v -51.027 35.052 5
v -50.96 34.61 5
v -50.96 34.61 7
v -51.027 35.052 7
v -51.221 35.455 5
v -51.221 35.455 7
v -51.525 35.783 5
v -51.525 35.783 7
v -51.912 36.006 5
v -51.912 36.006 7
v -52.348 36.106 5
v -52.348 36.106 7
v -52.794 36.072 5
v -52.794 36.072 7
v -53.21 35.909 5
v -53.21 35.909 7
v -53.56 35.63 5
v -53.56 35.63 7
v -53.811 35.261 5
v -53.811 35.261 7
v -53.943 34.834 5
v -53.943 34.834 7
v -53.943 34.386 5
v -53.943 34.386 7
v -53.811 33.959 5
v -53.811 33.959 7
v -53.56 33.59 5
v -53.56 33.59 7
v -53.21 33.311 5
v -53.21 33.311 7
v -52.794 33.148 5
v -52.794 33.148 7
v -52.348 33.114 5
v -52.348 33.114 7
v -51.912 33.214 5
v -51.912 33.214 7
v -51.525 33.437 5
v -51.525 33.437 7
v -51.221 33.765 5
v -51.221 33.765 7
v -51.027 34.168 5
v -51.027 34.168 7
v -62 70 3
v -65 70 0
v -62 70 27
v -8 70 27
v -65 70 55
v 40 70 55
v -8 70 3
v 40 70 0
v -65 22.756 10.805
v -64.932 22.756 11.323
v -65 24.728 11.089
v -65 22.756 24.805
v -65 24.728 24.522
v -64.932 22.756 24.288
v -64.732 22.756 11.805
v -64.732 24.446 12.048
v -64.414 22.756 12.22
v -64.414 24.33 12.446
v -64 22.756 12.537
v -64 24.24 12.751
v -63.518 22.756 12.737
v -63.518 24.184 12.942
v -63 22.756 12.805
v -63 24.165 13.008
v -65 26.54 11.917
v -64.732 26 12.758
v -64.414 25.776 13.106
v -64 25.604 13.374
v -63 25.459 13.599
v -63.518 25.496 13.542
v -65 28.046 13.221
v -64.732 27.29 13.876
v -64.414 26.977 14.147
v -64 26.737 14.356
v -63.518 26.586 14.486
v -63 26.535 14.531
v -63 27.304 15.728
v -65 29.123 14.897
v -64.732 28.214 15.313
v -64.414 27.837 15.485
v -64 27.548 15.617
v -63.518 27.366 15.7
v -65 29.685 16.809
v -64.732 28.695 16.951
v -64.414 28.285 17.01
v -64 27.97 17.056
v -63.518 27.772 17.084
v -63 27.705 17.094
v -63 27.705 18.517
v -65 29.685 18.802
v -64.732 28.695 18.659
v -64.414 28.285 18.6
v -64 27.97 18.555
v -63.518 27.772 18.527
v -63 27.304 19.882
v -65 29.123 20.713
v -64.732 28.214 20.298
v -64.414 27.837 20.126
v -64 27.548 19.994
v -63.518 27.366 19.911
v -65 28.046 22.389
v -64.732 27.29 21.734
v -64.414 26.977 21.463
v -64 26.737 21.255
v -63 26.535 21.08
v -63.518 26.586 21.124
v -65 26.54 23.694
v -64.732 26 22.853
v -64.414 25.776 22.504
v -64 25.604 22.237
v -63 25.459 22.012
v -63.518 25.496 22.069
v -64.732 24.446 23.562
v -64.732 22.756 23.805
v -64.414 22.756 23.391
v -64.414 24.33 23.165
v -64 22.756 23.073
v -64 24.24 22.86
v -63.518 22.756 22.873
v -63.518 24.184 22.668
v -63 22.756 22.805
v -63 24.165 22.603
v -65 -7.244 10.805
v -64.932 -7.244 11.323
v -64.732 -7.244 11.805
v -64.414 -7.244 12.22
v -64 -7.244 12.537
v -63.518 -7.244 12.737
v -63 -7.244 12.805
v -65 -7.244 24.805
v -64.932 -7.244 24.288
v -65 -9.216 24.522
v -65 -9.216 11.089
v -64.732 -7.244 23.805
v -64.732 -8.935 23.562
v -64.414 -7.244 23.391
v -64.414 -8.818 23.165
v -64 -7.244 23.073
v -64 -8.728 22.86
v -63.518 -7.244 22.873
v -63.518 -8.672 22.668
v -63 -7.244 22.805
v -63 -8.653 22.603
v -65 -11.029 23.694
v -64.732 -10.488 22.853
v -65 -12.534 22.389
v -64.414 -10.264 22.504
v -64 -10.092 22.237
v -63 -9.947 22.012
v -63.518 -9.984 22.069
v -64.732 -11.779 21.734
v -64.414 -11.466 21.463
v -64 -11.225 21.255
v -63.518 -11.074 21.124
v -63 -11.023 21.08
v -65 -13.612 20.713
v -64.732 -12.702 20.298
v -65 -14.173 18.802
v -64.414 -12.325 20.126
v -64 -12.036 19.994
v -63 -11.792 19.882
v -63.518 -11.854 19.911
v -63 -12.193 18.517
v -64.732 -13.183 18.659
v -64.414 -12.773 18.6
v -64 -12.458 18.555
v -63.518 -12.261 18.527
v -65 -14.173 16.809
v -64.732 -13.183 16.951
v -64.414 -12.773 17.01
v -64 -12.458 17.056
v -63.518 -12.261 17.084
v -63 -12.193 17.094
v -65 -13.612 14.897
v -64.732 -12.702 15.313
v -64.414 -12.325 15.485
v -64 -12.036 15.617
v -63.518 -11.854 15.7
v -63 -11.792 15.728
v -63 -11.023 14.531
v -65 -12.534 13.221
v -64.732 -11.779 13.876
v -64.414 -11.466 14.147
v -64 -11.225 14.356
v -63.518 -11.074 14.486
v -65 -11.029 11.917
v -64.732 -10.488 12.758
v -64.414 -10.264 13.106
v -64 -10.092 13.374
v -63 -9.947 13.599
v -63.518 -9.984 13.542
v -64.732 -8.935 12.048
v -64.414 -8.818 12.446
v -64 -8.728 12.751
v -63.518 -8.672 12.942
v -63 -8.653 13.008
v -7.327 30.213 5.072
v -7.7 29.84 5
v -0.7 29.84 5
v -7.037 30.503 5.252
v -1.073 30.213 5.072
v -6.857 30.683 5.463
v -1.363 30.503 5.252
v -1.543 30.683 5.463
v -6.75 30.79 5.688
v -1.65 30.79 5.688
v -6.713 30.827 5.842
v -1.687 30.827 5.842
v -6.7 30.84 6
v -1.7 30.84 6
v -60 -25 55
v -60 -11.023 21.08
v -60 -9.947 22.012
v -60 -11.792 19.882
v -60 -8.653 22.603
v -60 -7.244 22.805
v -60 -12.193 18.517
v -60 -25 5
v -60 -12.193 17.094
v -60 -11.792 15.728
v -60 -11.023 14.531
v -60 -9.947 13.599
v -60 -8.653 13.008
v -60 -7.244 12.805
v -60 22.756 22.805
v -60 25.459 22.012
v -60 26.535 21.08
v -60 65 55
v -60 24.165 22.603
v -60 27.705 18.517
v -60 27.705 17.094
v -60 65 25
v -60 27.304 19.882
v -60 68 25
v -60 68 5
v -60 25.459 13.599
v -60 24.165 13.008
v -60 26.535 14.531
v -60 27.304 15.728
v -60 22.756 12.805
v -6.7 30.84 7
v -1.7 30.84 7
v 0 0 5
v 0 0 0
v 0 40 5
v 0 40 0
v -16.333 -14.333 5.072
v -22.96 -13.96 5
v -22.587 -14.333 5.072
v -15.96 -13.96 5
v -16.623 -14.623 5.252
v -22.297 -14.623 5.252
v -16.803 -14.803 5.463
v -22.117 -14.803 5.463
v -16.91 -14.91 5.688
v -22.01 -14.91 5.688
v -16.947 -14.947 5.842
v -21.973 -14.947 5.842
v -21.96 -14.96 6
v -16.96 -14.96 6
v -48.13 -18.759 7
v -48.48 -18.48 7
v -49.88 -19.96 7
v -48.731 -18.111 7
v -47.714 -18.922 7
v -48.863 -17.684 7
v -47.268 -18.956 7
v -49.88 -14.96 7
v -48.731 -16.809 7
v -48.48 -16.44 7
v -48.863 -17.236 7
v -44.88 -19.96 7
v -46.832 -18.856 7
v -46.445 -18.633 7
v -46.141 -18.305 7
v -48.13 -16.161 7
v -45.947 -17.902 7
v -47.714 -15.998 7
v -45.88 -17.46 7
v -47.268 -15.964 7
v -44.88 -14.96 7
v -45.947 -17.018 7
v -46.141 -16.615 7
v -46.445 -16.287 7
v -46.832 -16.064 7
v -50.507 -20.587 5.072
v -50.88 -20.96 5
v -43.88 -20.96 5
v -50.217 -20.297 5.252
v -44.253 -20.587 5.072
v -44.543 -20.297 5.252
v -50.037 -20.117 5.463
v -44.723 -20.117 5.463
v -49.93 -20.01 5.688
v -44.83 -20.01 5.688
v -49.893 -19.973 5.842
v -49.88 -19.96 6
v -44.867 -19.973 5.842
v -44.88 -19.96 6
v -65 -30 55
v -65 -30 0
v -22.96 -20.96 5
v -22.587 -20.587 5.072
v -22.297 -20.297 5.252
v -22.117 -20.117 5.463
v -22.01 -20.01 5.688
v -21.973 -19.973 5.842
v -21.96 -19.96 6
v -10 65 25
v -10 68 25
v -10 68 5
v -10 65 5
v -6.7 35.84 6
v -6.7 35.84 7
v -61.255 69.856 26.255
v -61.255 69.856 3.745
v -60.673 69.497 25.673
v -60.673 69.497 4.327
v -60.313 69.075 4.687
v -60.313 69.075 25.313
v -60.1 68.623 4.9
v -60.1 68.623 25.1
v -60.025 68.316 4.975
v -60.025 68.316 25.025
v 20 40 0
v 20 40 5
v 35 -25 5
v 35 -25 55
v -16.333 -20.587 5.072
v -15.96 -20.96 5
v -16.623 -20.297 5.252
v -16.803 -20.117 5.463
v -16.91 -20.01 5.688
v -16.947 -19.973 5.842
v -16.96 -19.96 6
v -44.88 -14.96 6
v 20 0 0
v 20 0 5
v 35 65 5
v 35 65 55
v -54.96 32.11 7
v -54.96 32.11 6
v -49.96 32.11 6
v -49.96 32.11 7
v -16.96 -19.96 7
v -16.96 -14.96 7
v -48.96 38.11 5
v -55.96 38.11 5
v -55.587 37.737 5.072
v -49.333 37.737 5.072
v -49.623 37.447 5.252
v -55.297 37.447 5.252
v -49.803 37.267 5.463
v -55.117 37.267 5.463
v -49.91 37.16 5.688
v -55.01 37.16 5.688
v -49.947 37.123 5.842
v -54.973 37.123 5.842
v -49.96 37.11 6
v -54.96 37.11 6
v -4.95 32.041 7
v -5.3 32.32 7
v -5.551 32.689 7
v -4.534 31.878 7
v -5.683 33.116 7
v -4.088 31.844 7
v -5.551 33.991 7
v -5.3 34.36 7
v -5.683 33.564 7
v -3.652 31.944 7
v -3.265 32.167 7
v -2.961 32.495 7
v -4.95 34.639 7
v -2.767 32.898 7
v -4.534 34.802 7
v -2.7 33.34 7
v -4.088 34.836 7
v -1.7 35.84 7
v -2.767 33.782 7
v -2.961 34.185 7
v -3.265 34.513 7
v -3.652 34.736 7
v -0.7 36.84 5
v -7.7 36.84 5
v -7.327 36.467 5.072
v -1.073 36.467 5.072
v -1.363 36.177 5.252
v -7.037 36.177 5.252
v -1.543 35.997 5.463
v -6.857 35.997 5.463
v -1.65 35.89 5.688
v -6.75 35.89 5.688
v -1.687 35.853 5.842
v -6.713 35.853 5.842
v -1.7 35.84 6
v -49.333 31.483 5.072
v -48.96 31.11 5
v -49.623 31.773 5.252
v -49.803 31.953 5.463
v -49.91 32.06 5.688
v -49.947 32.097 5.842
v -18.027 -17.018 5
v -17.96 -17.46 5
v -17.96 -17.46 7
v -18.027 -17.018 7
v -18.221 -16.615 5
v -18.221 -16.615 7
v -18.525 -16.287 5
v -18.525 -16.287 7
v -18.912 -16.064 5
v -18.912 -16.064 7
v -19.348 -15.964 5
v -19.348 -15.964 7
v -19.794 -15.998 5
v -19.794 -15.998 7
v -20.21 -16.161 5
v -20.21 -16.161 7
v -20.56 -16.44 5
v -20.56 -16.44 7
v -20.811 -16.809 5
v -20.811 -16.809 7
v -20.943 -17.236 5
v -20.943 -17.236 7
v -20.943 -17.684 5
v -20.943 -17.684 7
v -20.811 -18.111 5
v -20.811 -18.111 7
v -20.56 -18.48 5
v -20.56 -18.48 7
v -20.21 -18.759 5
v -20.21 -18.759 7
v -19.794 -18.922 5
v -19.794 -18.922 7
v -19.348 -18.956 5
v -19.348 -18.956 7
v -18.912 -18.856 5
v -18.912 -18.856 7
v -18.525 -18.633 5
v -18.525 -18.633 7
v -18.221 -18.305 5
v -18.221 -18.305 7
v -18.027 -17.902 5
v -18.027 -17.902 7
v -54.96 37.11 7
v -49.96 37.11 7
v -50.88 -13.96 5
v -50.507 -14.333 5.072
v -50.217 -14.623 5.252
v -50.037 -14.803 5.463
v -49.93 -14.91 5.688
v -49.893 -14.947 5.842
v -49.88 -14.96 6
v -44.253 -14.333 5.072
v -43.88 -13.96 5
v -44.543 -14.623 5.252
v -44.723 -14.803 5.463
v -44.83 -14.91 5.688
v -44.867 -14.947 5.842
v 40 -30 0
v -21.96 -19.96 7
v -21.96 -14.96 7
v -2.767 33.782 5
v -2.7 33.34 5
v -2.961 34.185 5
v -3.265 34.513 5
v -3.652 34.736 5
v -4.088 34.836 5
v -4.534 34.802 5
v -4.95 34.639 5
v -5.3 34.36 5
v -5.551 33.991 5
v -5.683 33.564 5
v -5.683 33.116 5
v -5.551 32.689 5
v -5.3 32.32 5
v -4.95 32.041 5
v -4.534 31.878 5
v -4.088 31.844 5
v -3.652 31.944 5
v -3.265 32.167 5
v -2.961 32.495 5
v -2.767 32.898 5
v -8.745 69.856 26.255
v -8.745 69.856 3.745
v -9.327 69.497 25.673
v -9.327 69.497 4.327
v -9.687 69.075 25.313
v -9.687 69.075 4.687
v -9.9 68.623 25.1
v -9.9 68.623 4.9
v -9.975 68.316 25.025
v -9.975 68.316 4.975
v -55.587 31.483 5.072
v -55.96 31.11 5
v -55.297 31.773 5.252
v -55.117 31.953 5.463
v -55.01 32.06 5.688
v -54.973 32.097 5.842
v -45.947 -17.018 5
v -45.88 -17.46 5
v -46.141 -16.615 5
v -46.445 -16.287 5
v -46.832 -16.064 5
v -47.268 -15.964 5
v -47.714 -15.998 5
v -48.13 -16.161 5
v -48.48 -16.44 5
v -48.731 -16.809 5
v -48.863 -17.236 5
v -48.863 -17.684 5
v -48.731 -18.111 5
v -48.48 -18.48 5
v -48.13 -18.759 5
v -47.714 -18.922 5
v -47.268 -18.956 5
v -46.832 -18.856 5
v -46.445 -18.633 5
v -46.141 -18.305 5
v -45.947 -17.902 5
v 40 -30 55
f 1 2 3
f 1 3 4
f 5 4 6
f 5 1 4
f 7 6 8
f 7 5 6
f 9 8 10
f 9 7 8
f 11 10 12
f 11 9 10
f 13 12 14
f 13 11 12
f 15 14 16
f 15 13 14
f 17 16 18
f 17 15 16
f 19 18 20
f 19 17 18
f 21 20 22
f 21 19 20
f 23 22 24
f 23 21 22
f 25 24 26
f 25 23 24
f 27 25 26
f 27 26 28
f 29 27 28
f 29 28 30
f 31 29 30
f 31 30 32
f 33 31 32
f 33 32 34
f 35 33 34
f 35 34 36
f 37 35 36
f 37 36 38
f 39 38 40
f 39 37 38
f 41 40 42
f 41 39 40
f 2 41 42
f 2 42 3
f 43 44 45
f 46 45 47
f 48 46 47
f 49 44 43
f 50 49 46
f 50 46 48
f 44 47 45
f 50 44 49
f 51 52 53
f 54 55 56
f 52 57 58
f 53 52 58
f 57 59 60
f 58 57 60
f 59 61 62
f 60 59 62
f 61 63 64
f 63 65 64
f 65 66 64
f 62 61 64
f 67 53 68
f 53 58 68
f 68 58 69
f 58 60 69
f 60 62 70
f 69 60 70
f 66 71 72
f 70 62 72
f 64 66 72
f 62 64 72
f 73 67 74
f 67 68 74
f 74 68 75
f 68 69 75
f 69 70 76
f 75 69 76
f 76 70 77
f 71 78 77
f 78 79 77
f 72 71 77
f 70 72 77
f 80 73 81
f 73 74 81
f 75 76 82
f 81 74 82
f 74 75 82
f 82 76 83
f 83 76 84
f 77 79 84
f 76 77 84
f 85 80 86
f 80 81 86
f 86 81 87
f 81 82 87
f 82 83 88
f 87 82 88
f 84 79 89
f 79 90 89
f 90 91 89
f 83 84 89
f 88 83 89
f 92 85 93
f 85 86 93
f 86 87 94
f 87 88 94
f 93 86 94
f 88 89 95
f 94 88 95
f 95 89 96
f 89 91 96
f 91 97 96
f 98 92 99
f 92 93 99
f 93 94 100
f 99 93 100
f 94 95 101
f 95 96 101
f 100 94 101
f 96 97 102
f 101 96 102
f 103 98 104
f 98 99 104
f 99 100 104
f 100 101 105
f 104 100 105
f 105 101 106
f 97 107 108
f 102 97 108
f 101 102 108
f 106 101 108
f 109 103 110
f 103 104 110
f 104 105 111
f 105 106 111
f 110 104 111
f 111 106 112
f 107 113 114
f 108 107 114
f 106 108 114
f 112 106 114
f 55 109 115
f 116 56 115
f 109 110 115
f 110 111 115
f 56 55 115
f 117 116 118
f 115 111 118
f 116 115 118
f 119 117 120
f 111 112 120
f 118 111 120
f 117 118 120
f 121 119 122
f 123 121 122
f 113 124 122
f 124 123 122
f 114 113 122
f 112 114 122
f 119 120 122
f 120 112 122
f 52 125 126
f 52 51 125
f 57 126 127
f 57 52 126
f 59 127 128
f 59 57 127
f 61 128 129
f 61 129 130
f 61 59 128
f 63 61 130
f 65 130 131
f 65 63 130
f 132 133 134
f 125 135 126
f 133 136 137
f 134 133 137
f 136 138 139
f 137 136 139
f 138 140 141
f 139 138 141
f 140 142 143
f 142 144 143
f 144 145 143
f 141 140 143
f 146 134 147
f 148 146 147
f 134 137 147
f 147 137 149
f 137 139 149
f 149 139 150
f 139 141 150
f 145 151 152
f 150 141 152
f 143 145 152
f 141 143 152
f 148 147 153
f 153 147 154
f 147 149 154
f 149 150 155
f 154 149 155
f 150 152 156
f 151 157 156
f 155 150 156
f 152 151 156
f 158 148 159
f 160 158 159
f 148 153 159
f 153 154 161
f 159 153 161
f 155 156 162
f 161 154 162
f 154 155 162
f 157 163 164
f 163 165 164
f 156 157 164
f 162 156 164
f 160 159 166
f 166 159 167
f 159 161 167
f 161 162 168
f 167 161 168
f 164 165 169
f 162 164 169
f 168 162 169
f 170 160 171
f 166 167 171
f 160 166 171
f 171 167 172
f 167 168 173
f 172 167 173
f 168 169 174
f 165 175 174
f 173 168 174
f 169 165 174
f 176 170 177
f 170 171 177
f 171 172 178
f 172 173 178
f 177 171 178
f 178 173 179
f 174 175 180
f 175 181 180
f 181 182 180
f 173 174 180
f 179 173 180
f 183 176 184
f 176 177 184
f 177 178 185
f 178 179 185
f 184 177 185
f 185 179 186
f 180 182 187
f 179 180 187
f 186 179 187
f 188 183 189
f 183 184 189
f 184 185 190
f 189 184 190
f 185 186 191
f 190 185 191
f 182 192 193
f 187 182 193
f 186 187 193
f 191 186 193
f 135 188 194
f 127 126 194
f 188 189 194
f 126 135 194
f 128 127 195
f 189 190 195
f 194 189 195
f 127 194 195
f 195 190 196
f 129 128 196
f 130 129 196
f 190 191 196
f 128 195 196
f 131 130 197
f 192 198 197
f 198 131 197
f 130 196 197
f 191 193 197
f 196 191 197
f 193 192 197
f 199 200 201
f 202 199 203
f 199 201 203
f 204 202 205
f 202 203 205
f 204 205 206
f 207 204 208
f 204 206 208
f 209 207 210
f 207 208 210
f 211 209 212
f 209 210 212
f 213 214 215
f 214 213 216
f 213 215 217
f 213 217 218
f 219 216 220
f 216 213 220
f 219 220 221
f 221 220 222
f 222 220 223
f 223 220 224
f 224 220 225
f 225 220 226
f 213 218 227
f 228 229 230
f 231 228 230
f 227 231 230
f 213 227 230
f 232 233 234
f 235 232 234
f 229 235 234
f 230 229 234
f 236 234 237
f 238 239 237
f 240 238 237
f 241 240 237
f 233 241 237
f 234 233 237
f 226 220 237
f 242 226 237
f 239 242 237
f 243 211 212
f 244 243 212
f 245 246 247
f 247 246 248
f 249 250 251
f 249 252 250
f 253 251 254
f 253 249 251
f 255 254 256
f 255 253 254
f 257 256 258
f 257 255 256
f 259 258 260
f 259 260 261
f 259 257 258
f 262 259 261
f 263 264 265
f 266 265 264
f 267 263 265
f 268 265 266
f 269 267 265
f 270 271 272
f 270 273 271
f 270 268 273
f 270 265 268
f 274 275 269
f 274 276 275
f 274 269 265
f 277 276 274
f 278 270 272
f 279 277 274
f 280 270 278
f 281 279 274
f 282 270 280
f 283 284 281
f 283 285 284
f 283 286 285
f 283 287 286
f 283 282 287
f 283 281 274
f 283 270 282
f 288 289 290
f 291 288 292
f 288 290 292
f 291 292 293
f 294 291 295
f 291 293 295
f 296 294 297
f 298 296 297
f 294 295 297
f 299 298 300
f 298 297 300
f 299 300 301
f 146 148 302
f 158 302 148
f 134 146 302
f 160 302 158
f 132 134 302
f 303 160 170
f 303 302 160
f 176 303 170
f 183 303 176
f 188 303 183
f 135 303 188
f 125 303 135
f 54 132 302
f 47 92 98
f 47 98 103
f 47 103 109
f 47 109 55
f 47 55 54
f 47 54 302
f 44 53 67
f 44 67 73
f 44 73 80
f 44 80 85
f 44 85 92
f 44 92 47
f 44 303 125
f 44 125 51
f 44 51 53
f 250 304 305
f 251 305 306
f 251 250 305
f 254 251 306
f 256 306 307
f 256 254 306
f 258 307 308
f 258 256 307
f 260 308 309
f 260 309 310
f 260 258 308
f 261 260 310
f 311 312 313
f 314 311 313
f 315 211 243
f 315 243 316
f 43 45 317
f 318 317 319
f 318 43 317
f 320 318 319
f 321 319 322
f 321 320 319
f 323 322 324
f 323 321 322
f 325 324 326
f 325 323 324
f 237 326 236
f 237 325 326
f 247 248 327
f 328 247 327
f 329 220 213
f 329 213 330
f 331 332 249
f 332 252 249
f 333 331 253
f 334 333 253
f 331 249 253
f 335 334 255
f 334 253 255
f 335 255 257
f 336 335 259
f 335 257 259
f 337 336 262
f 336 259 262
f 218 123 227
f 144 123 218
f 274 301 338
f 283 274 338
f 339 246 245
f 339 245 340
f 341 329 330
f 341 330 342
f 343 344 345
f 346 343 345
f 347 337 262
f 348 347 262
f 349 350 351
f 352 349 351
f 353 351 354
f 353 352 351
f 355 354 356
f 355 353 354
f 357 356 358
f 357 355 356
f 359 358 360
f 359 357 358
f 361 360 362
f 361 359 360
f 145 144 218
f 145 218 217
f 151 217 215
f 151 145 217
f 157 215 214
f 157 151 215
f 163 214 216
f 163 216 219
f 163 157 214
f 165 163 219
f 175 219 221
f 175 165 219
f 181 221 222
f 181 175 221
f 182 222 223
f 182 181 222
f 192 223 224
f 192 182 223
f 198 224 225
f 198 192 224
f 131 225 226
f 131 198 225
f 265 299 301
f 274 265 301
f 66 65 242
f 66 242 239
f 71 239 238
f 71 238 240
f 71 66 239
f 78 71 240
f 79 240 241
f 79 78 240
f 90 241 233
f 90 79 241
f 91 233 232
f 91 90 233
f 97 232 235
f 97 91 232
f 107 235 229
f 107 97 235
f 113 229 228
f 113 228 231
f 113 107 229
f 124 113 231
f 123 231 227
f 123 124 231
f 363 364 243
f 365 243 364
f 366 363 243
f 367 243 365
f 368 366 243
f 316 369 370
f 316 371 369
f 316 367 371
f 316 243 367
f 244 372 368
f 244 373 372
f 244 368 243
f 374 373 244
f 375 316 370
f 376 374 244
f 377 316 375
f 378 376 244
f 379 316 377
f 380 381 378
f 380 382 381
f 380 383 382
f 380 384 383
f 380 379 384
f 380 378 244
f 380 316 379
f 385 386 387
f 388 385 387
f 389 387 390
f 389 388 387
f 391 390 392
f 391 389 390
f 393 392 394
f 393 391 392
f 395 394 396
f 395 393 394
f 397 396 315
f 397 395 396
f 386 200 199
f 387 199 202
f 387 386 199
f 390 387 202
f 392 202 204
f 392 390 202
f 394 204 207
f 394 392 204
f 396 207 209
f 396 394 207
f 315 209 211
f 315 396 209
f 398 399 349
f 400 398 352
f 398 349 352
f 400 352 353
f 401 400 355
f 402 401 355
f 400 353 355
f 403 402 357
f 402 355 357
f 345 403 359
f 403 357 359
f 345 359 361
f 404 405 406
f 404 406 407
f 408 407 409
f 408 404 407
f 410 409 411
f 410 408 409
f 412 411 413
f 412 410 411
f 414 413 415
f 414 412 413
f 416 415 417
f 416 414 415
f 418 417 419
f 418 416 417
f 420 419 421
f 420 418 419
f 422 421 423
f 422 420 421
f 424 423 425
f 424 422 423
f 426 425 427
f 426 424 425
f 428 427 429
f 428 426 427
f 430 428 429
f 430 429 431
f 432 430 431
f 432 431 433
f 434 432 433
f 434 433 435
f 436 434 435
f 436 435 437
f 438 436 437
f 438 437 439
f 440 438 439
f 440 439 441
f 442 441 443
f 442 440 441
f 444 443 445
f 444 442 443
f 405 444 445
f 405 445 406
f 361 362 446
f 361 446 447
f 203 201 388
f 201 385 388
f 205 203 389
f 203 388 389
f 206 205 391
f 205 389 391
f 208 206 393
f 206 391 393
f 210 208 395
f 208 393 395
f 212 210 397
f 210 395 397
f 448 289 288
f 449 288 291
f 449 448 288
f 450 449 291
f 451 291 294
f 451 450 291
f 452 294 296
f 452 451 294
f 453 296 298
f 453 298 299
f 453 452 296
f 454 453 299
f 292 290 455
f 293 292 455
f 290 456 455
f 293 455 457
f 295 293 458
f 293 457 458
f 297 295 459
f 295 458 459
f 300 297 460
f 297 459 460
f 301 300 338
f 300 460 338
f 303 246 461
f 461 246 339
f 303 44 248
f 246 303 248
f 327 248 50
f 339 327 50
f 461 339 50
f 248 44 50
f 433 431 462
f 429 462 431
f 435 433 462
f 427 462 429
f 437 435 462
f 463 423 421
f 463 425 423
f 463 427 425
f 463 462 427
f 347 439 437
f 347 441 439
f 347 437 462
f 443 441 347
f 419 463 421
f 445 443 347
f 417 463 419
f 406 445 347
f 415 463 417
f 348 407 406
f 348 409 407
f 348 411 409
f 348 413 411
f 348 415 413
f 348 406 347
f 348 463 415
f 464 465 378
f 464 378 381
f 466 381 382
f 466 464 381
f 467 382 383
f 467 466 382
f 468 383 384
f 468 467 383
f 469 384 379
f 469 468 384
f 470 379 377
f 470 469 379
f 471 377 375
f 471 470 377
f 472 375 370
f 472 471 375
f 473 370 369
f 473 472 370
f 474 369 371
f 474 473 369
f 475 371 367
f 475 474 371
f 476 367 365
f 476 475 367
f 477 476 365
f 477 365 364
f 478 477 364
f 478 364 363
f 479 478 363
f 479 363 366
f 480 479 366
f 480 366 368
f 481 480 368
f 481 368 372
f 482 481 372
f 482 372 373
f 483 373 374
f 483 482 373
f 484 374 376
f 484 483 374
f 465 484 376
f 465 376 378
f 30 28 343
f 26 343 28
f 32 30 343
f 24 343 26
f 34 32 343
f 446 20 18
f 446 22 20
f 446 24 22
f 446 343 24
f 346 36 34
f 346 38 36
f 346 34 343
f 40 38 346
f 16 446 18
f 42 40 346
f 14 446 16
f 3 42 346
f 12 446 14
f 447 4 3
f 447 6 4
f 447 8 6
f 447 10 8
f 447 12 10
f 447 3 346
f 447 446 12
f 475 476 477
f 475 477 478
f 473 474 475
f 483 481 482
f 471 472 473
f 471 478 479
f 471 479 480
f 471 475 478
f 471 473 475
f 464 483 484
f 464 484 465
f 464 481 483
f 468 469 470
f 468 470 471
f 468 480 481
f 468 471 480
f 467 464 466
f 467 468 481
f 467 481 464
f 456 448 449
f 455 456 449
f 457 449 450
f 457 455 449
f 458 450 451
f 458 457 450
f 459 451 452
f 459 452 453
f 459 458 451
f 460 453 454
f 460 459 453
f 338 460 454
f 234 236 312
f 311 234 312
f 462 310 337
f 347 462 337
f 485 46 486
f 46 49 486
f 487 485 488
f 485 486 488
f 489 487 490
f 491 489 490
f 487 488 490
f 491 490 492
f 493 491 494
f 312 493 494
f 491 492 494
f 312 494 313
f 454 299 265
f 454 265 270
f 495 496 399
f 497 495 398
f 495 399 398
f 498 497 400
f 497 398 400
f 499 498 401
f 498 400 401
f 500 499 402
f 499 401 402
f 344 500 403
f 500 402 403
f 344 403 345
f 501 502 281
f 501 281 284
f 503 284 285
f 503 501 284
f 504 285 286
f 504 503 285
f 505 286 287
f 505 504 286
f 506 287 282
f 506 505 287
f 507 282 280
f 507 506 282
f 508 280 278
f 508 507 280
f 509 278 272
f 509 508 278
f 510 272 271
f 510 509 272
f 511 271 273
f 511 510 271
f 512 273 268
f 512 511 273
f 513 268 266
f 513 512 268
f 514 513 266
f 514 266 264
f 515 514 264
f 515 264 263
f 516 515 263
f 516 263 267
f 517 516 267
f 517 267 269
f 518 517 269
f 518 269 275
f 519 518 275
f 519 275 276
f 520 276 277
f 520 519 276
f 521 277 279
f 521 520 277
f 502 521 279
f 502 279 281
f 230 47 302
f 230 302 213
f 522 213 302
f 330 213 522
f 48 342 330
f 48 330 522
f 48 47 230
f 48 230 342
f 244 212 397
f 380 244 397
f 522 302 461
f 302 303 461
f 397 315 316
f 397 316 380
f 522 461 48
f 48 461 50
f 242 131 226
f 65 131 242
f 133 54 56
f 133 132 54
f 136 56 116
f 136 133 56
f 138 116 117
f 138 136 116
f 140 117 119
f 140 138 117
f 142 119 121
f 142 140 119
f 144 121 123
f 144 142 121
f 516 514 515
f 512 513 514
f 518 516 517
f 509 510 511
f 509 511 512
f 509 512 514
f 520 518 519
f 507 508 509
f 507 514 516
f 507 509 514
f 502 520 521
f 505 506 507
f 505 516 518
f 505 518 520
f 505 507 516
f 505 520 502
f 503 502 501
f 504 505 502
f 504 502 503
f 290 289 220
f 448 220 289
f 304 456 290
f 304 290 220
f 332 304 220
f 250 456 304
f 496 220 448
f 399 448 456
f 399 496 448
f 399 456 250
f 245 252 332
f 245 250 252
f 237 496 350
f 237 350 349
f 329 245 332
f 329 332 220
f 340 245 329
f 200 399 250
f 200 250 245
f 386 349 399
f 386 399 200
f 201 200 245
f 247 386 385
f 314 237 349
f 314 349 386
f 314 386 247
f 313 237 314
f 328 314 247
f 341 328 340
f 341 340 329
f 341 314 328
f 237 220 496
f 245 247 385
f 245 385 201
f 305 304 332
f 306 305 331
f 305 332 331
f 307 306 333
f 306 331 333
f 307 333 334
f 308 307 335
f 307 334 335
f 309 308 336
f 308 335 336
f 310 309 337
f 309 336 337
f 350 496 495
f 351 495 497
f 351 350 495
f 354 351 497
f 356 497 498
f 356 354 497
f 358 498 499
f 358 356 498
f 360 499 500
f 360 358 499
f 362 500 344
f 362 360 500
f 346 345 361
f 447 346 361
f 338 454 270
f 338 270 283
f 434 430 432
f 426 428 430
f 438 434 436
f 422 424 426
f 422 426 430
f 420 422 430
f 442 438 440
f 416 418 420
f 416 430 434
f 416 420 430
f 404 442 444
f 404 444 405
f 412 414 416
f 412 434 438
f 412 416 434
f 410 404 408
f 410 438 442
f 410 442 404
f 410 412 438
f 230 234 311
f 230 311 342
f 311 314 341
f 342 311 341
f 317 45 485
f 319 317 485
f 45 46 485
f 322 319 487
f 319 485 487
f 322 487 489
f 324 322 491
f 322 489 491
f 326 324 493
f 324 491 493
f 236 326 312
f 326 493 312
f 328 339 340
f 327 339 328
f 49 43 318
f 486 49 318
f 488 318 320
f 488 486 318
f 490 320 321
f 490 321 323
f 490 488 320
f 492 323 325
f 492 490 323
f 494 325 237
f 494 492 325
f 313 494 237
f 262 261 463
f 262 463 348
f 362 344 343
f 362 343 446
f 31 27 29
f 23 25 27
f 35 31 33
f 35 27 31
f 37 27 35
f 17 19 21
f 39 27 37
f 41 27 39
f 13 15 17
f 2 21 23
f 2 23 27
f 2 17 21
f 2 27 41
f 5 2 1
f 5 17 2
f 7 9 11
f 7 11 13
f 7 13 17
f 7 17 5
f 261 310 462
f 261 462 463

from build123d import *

# Parameters (mm, degrees)
SKETCH1_W           = 105
SKETCH1_H           = 100
SKETCH1_W_2         = 20
SKETCH1_H_2         = 40
BOSS_EXTRUDE1_DEPTH = 5
SKETCH2_W           = 105
SKETCH2_H           = 100
SKETCH2_W_2         = 95
SKETCH2_H_2         = 90
BOSS_EXTRUDE2_DEPTH = 50
SKETCH4_W           = 5
SKETCH4_H           = 5
SKETCH4_R           = 1.5
BOSS_EXTRUDE3_DEPTH = 2
FILLET1_R           = 1
SKETCH5_W           = 50
SKETCH5_H           = 20
CUT_EXTRUDE1_DEPTH  = 5
CUT_EXTRUDE2_DEPTH  = 5
FILLET2_R           = 2
FILLET3_R           = 2


with BuildPart() as part:
    # Sketch1 → Boss-Extrude1 (new body)
    with BuildSketch(Plane.XY):
        with Locations((-12.5, 20)):
            Rectangle(SKETCH1_W, SKETCH1_H)
        with Locations((10, 20)):
            Rectangle(SKETCH1_W_2, SKETCH1_H_2, mode=Mode.SUBTRACT)
    extrude(amount=BOSS_EXTRUDE1_DEPTH)

    # Sketch2 → Boss-Extrude2 (add)
    with BuildSketch(Plane.XY.offset(5)):
        with Locations((-12.5, 20)):
            Rectangle(SKETCH2_W, SKETCH2_H)
        with Locations((-12.5, 20)):
            Rectangle(SKETCH2_W_2, SKETCH2_H_2, mode=Mode.SUBTRACT)
    extrude(amount=BOSS_EXTRUDE2_DEPTH)

    # Sketch4 → Boss-Extrude3 (add)
    with BuildSketch(Plane.XY.offset(5)):
        with Locations((-52.46, 34.61)):
            Rectangle(SKETCH4_W, SKETCH4_H)
        with Locations((-52.46, 34.61)):
            Circle(SKETCH4_R, mode=Mode.SUBTRACT)
        with Locations((-4.2, 33.34)):
            Rectangle(SKETCH4_W, SKETCH4_H)
        with Locations((-4.2, 33.34)):
            Circle(SKETCH4_R, mode=Mode.SUBTRACT)
        with Locations((-47.38, -17.46)):
            Rectangle(SKETCH4_W, SKETCH4_H)
        with Locations((-47.38, -17.46)):
            Circle(SKETCH4_R, mode=Mode.SUBTRACT)
        with Locations((-19.46, -17.46)):
            Rectangle(SKETCH4_W, SKETCH4_H)
        with Locations((-19.46, -17.46)):
            Circle(SKETCH4_R, mode=Mode.SUBTRACT)
    extrude(amount=BOSS_EXTRUDE3_DEPTH)

    # Fillet1
    fillet1_edges = [part.edges().sort_by_distance(p)[0] for p in [
        (-49.96, 34.61, 5),
        (-52.46, 37.11, 5),
        (-54.96, 34.61, 5),
        (-52.46, 32.11, 5),
        (-1.7, 33.34, 5),
        (-4.2, 35.84, 5),
        (-6.7, 33.34, 5),
        (-4.2, 30.84, 5),
        (-44.88, -17.46, 5),
        (-47.38, -14.96, 5),
        (-49.88, -17.46, 5),
        (-47.38, -19.96, 5),
        (-16.96, -17.46, 5),
        (-19.46, -14.96, 5),
        (-21.96, -17.46, 5),
        (-19.46, -19.96, 5),
    ]]
    fillet(fillet1_edges, radius=FILLET1_R)

    # Sketch5 → Cut-Extrude1 (cut)
    with BuildSketch(Plane(origin=(0, 70, 0), x_dir=(1, 0, 0), z_dir=(0, 1, 0))):
        with Locations((-35, -15)):
            Rectangle(SKETCH5_W, SKETCH5_H)
    extrude(amount=-CUT_EXTRUDE1_DEPTH, mode=Mode.SUBTRACT)

    # Sketch6 → Cut-Extrude2 (cut)
    with BuildSketch(Plane.ZY.offset(65)):
        with BuildLine():
            Line((22.805324428, 22.755889518), (22.805324428, -7.244110482))
            ThreePointArc((22.805324428, -7.244110482), (17.805324428, -12.244110482), (12.805324428, -7.244110482))
            Line((12.805324428, -7.244110482), (12.805324428, 22.755889518))
            ThreePointArc((12.805324428, 22.755889518), (17.805324428, 27.755889518), (22.805324428, 22.755889518))
        make_face()
    extrude(amount=-CUT_EXTRUDE2_DEPTH, mode=Mode.SUBTRACT)

    # Fillet2
    fillet2_edges = [part.edges().sort_by_distance(p)[0] for p in [
        (-65, 27.755889518, 17.805324428),
        (-65, 7.755889518, 12.805324428),
        (-65, -12.244110482, 17.805324428),
        (-65, 7.755889518, 22.805324428),
    ]]
    fillet(fillet2_edges, radius=FILLET2_R)

    # Fillet3
    fillet3_edges = [part.edges().sort_by_distance(p)[0] for p in [
        (-60, 70, 15),
        (-35, 70, 25),
        (-10, 70, 15),
        (-35, 70, 5),
    ]]
    fillet(fillet3_edges, radius=FILLET3_R)


solid = part.part
